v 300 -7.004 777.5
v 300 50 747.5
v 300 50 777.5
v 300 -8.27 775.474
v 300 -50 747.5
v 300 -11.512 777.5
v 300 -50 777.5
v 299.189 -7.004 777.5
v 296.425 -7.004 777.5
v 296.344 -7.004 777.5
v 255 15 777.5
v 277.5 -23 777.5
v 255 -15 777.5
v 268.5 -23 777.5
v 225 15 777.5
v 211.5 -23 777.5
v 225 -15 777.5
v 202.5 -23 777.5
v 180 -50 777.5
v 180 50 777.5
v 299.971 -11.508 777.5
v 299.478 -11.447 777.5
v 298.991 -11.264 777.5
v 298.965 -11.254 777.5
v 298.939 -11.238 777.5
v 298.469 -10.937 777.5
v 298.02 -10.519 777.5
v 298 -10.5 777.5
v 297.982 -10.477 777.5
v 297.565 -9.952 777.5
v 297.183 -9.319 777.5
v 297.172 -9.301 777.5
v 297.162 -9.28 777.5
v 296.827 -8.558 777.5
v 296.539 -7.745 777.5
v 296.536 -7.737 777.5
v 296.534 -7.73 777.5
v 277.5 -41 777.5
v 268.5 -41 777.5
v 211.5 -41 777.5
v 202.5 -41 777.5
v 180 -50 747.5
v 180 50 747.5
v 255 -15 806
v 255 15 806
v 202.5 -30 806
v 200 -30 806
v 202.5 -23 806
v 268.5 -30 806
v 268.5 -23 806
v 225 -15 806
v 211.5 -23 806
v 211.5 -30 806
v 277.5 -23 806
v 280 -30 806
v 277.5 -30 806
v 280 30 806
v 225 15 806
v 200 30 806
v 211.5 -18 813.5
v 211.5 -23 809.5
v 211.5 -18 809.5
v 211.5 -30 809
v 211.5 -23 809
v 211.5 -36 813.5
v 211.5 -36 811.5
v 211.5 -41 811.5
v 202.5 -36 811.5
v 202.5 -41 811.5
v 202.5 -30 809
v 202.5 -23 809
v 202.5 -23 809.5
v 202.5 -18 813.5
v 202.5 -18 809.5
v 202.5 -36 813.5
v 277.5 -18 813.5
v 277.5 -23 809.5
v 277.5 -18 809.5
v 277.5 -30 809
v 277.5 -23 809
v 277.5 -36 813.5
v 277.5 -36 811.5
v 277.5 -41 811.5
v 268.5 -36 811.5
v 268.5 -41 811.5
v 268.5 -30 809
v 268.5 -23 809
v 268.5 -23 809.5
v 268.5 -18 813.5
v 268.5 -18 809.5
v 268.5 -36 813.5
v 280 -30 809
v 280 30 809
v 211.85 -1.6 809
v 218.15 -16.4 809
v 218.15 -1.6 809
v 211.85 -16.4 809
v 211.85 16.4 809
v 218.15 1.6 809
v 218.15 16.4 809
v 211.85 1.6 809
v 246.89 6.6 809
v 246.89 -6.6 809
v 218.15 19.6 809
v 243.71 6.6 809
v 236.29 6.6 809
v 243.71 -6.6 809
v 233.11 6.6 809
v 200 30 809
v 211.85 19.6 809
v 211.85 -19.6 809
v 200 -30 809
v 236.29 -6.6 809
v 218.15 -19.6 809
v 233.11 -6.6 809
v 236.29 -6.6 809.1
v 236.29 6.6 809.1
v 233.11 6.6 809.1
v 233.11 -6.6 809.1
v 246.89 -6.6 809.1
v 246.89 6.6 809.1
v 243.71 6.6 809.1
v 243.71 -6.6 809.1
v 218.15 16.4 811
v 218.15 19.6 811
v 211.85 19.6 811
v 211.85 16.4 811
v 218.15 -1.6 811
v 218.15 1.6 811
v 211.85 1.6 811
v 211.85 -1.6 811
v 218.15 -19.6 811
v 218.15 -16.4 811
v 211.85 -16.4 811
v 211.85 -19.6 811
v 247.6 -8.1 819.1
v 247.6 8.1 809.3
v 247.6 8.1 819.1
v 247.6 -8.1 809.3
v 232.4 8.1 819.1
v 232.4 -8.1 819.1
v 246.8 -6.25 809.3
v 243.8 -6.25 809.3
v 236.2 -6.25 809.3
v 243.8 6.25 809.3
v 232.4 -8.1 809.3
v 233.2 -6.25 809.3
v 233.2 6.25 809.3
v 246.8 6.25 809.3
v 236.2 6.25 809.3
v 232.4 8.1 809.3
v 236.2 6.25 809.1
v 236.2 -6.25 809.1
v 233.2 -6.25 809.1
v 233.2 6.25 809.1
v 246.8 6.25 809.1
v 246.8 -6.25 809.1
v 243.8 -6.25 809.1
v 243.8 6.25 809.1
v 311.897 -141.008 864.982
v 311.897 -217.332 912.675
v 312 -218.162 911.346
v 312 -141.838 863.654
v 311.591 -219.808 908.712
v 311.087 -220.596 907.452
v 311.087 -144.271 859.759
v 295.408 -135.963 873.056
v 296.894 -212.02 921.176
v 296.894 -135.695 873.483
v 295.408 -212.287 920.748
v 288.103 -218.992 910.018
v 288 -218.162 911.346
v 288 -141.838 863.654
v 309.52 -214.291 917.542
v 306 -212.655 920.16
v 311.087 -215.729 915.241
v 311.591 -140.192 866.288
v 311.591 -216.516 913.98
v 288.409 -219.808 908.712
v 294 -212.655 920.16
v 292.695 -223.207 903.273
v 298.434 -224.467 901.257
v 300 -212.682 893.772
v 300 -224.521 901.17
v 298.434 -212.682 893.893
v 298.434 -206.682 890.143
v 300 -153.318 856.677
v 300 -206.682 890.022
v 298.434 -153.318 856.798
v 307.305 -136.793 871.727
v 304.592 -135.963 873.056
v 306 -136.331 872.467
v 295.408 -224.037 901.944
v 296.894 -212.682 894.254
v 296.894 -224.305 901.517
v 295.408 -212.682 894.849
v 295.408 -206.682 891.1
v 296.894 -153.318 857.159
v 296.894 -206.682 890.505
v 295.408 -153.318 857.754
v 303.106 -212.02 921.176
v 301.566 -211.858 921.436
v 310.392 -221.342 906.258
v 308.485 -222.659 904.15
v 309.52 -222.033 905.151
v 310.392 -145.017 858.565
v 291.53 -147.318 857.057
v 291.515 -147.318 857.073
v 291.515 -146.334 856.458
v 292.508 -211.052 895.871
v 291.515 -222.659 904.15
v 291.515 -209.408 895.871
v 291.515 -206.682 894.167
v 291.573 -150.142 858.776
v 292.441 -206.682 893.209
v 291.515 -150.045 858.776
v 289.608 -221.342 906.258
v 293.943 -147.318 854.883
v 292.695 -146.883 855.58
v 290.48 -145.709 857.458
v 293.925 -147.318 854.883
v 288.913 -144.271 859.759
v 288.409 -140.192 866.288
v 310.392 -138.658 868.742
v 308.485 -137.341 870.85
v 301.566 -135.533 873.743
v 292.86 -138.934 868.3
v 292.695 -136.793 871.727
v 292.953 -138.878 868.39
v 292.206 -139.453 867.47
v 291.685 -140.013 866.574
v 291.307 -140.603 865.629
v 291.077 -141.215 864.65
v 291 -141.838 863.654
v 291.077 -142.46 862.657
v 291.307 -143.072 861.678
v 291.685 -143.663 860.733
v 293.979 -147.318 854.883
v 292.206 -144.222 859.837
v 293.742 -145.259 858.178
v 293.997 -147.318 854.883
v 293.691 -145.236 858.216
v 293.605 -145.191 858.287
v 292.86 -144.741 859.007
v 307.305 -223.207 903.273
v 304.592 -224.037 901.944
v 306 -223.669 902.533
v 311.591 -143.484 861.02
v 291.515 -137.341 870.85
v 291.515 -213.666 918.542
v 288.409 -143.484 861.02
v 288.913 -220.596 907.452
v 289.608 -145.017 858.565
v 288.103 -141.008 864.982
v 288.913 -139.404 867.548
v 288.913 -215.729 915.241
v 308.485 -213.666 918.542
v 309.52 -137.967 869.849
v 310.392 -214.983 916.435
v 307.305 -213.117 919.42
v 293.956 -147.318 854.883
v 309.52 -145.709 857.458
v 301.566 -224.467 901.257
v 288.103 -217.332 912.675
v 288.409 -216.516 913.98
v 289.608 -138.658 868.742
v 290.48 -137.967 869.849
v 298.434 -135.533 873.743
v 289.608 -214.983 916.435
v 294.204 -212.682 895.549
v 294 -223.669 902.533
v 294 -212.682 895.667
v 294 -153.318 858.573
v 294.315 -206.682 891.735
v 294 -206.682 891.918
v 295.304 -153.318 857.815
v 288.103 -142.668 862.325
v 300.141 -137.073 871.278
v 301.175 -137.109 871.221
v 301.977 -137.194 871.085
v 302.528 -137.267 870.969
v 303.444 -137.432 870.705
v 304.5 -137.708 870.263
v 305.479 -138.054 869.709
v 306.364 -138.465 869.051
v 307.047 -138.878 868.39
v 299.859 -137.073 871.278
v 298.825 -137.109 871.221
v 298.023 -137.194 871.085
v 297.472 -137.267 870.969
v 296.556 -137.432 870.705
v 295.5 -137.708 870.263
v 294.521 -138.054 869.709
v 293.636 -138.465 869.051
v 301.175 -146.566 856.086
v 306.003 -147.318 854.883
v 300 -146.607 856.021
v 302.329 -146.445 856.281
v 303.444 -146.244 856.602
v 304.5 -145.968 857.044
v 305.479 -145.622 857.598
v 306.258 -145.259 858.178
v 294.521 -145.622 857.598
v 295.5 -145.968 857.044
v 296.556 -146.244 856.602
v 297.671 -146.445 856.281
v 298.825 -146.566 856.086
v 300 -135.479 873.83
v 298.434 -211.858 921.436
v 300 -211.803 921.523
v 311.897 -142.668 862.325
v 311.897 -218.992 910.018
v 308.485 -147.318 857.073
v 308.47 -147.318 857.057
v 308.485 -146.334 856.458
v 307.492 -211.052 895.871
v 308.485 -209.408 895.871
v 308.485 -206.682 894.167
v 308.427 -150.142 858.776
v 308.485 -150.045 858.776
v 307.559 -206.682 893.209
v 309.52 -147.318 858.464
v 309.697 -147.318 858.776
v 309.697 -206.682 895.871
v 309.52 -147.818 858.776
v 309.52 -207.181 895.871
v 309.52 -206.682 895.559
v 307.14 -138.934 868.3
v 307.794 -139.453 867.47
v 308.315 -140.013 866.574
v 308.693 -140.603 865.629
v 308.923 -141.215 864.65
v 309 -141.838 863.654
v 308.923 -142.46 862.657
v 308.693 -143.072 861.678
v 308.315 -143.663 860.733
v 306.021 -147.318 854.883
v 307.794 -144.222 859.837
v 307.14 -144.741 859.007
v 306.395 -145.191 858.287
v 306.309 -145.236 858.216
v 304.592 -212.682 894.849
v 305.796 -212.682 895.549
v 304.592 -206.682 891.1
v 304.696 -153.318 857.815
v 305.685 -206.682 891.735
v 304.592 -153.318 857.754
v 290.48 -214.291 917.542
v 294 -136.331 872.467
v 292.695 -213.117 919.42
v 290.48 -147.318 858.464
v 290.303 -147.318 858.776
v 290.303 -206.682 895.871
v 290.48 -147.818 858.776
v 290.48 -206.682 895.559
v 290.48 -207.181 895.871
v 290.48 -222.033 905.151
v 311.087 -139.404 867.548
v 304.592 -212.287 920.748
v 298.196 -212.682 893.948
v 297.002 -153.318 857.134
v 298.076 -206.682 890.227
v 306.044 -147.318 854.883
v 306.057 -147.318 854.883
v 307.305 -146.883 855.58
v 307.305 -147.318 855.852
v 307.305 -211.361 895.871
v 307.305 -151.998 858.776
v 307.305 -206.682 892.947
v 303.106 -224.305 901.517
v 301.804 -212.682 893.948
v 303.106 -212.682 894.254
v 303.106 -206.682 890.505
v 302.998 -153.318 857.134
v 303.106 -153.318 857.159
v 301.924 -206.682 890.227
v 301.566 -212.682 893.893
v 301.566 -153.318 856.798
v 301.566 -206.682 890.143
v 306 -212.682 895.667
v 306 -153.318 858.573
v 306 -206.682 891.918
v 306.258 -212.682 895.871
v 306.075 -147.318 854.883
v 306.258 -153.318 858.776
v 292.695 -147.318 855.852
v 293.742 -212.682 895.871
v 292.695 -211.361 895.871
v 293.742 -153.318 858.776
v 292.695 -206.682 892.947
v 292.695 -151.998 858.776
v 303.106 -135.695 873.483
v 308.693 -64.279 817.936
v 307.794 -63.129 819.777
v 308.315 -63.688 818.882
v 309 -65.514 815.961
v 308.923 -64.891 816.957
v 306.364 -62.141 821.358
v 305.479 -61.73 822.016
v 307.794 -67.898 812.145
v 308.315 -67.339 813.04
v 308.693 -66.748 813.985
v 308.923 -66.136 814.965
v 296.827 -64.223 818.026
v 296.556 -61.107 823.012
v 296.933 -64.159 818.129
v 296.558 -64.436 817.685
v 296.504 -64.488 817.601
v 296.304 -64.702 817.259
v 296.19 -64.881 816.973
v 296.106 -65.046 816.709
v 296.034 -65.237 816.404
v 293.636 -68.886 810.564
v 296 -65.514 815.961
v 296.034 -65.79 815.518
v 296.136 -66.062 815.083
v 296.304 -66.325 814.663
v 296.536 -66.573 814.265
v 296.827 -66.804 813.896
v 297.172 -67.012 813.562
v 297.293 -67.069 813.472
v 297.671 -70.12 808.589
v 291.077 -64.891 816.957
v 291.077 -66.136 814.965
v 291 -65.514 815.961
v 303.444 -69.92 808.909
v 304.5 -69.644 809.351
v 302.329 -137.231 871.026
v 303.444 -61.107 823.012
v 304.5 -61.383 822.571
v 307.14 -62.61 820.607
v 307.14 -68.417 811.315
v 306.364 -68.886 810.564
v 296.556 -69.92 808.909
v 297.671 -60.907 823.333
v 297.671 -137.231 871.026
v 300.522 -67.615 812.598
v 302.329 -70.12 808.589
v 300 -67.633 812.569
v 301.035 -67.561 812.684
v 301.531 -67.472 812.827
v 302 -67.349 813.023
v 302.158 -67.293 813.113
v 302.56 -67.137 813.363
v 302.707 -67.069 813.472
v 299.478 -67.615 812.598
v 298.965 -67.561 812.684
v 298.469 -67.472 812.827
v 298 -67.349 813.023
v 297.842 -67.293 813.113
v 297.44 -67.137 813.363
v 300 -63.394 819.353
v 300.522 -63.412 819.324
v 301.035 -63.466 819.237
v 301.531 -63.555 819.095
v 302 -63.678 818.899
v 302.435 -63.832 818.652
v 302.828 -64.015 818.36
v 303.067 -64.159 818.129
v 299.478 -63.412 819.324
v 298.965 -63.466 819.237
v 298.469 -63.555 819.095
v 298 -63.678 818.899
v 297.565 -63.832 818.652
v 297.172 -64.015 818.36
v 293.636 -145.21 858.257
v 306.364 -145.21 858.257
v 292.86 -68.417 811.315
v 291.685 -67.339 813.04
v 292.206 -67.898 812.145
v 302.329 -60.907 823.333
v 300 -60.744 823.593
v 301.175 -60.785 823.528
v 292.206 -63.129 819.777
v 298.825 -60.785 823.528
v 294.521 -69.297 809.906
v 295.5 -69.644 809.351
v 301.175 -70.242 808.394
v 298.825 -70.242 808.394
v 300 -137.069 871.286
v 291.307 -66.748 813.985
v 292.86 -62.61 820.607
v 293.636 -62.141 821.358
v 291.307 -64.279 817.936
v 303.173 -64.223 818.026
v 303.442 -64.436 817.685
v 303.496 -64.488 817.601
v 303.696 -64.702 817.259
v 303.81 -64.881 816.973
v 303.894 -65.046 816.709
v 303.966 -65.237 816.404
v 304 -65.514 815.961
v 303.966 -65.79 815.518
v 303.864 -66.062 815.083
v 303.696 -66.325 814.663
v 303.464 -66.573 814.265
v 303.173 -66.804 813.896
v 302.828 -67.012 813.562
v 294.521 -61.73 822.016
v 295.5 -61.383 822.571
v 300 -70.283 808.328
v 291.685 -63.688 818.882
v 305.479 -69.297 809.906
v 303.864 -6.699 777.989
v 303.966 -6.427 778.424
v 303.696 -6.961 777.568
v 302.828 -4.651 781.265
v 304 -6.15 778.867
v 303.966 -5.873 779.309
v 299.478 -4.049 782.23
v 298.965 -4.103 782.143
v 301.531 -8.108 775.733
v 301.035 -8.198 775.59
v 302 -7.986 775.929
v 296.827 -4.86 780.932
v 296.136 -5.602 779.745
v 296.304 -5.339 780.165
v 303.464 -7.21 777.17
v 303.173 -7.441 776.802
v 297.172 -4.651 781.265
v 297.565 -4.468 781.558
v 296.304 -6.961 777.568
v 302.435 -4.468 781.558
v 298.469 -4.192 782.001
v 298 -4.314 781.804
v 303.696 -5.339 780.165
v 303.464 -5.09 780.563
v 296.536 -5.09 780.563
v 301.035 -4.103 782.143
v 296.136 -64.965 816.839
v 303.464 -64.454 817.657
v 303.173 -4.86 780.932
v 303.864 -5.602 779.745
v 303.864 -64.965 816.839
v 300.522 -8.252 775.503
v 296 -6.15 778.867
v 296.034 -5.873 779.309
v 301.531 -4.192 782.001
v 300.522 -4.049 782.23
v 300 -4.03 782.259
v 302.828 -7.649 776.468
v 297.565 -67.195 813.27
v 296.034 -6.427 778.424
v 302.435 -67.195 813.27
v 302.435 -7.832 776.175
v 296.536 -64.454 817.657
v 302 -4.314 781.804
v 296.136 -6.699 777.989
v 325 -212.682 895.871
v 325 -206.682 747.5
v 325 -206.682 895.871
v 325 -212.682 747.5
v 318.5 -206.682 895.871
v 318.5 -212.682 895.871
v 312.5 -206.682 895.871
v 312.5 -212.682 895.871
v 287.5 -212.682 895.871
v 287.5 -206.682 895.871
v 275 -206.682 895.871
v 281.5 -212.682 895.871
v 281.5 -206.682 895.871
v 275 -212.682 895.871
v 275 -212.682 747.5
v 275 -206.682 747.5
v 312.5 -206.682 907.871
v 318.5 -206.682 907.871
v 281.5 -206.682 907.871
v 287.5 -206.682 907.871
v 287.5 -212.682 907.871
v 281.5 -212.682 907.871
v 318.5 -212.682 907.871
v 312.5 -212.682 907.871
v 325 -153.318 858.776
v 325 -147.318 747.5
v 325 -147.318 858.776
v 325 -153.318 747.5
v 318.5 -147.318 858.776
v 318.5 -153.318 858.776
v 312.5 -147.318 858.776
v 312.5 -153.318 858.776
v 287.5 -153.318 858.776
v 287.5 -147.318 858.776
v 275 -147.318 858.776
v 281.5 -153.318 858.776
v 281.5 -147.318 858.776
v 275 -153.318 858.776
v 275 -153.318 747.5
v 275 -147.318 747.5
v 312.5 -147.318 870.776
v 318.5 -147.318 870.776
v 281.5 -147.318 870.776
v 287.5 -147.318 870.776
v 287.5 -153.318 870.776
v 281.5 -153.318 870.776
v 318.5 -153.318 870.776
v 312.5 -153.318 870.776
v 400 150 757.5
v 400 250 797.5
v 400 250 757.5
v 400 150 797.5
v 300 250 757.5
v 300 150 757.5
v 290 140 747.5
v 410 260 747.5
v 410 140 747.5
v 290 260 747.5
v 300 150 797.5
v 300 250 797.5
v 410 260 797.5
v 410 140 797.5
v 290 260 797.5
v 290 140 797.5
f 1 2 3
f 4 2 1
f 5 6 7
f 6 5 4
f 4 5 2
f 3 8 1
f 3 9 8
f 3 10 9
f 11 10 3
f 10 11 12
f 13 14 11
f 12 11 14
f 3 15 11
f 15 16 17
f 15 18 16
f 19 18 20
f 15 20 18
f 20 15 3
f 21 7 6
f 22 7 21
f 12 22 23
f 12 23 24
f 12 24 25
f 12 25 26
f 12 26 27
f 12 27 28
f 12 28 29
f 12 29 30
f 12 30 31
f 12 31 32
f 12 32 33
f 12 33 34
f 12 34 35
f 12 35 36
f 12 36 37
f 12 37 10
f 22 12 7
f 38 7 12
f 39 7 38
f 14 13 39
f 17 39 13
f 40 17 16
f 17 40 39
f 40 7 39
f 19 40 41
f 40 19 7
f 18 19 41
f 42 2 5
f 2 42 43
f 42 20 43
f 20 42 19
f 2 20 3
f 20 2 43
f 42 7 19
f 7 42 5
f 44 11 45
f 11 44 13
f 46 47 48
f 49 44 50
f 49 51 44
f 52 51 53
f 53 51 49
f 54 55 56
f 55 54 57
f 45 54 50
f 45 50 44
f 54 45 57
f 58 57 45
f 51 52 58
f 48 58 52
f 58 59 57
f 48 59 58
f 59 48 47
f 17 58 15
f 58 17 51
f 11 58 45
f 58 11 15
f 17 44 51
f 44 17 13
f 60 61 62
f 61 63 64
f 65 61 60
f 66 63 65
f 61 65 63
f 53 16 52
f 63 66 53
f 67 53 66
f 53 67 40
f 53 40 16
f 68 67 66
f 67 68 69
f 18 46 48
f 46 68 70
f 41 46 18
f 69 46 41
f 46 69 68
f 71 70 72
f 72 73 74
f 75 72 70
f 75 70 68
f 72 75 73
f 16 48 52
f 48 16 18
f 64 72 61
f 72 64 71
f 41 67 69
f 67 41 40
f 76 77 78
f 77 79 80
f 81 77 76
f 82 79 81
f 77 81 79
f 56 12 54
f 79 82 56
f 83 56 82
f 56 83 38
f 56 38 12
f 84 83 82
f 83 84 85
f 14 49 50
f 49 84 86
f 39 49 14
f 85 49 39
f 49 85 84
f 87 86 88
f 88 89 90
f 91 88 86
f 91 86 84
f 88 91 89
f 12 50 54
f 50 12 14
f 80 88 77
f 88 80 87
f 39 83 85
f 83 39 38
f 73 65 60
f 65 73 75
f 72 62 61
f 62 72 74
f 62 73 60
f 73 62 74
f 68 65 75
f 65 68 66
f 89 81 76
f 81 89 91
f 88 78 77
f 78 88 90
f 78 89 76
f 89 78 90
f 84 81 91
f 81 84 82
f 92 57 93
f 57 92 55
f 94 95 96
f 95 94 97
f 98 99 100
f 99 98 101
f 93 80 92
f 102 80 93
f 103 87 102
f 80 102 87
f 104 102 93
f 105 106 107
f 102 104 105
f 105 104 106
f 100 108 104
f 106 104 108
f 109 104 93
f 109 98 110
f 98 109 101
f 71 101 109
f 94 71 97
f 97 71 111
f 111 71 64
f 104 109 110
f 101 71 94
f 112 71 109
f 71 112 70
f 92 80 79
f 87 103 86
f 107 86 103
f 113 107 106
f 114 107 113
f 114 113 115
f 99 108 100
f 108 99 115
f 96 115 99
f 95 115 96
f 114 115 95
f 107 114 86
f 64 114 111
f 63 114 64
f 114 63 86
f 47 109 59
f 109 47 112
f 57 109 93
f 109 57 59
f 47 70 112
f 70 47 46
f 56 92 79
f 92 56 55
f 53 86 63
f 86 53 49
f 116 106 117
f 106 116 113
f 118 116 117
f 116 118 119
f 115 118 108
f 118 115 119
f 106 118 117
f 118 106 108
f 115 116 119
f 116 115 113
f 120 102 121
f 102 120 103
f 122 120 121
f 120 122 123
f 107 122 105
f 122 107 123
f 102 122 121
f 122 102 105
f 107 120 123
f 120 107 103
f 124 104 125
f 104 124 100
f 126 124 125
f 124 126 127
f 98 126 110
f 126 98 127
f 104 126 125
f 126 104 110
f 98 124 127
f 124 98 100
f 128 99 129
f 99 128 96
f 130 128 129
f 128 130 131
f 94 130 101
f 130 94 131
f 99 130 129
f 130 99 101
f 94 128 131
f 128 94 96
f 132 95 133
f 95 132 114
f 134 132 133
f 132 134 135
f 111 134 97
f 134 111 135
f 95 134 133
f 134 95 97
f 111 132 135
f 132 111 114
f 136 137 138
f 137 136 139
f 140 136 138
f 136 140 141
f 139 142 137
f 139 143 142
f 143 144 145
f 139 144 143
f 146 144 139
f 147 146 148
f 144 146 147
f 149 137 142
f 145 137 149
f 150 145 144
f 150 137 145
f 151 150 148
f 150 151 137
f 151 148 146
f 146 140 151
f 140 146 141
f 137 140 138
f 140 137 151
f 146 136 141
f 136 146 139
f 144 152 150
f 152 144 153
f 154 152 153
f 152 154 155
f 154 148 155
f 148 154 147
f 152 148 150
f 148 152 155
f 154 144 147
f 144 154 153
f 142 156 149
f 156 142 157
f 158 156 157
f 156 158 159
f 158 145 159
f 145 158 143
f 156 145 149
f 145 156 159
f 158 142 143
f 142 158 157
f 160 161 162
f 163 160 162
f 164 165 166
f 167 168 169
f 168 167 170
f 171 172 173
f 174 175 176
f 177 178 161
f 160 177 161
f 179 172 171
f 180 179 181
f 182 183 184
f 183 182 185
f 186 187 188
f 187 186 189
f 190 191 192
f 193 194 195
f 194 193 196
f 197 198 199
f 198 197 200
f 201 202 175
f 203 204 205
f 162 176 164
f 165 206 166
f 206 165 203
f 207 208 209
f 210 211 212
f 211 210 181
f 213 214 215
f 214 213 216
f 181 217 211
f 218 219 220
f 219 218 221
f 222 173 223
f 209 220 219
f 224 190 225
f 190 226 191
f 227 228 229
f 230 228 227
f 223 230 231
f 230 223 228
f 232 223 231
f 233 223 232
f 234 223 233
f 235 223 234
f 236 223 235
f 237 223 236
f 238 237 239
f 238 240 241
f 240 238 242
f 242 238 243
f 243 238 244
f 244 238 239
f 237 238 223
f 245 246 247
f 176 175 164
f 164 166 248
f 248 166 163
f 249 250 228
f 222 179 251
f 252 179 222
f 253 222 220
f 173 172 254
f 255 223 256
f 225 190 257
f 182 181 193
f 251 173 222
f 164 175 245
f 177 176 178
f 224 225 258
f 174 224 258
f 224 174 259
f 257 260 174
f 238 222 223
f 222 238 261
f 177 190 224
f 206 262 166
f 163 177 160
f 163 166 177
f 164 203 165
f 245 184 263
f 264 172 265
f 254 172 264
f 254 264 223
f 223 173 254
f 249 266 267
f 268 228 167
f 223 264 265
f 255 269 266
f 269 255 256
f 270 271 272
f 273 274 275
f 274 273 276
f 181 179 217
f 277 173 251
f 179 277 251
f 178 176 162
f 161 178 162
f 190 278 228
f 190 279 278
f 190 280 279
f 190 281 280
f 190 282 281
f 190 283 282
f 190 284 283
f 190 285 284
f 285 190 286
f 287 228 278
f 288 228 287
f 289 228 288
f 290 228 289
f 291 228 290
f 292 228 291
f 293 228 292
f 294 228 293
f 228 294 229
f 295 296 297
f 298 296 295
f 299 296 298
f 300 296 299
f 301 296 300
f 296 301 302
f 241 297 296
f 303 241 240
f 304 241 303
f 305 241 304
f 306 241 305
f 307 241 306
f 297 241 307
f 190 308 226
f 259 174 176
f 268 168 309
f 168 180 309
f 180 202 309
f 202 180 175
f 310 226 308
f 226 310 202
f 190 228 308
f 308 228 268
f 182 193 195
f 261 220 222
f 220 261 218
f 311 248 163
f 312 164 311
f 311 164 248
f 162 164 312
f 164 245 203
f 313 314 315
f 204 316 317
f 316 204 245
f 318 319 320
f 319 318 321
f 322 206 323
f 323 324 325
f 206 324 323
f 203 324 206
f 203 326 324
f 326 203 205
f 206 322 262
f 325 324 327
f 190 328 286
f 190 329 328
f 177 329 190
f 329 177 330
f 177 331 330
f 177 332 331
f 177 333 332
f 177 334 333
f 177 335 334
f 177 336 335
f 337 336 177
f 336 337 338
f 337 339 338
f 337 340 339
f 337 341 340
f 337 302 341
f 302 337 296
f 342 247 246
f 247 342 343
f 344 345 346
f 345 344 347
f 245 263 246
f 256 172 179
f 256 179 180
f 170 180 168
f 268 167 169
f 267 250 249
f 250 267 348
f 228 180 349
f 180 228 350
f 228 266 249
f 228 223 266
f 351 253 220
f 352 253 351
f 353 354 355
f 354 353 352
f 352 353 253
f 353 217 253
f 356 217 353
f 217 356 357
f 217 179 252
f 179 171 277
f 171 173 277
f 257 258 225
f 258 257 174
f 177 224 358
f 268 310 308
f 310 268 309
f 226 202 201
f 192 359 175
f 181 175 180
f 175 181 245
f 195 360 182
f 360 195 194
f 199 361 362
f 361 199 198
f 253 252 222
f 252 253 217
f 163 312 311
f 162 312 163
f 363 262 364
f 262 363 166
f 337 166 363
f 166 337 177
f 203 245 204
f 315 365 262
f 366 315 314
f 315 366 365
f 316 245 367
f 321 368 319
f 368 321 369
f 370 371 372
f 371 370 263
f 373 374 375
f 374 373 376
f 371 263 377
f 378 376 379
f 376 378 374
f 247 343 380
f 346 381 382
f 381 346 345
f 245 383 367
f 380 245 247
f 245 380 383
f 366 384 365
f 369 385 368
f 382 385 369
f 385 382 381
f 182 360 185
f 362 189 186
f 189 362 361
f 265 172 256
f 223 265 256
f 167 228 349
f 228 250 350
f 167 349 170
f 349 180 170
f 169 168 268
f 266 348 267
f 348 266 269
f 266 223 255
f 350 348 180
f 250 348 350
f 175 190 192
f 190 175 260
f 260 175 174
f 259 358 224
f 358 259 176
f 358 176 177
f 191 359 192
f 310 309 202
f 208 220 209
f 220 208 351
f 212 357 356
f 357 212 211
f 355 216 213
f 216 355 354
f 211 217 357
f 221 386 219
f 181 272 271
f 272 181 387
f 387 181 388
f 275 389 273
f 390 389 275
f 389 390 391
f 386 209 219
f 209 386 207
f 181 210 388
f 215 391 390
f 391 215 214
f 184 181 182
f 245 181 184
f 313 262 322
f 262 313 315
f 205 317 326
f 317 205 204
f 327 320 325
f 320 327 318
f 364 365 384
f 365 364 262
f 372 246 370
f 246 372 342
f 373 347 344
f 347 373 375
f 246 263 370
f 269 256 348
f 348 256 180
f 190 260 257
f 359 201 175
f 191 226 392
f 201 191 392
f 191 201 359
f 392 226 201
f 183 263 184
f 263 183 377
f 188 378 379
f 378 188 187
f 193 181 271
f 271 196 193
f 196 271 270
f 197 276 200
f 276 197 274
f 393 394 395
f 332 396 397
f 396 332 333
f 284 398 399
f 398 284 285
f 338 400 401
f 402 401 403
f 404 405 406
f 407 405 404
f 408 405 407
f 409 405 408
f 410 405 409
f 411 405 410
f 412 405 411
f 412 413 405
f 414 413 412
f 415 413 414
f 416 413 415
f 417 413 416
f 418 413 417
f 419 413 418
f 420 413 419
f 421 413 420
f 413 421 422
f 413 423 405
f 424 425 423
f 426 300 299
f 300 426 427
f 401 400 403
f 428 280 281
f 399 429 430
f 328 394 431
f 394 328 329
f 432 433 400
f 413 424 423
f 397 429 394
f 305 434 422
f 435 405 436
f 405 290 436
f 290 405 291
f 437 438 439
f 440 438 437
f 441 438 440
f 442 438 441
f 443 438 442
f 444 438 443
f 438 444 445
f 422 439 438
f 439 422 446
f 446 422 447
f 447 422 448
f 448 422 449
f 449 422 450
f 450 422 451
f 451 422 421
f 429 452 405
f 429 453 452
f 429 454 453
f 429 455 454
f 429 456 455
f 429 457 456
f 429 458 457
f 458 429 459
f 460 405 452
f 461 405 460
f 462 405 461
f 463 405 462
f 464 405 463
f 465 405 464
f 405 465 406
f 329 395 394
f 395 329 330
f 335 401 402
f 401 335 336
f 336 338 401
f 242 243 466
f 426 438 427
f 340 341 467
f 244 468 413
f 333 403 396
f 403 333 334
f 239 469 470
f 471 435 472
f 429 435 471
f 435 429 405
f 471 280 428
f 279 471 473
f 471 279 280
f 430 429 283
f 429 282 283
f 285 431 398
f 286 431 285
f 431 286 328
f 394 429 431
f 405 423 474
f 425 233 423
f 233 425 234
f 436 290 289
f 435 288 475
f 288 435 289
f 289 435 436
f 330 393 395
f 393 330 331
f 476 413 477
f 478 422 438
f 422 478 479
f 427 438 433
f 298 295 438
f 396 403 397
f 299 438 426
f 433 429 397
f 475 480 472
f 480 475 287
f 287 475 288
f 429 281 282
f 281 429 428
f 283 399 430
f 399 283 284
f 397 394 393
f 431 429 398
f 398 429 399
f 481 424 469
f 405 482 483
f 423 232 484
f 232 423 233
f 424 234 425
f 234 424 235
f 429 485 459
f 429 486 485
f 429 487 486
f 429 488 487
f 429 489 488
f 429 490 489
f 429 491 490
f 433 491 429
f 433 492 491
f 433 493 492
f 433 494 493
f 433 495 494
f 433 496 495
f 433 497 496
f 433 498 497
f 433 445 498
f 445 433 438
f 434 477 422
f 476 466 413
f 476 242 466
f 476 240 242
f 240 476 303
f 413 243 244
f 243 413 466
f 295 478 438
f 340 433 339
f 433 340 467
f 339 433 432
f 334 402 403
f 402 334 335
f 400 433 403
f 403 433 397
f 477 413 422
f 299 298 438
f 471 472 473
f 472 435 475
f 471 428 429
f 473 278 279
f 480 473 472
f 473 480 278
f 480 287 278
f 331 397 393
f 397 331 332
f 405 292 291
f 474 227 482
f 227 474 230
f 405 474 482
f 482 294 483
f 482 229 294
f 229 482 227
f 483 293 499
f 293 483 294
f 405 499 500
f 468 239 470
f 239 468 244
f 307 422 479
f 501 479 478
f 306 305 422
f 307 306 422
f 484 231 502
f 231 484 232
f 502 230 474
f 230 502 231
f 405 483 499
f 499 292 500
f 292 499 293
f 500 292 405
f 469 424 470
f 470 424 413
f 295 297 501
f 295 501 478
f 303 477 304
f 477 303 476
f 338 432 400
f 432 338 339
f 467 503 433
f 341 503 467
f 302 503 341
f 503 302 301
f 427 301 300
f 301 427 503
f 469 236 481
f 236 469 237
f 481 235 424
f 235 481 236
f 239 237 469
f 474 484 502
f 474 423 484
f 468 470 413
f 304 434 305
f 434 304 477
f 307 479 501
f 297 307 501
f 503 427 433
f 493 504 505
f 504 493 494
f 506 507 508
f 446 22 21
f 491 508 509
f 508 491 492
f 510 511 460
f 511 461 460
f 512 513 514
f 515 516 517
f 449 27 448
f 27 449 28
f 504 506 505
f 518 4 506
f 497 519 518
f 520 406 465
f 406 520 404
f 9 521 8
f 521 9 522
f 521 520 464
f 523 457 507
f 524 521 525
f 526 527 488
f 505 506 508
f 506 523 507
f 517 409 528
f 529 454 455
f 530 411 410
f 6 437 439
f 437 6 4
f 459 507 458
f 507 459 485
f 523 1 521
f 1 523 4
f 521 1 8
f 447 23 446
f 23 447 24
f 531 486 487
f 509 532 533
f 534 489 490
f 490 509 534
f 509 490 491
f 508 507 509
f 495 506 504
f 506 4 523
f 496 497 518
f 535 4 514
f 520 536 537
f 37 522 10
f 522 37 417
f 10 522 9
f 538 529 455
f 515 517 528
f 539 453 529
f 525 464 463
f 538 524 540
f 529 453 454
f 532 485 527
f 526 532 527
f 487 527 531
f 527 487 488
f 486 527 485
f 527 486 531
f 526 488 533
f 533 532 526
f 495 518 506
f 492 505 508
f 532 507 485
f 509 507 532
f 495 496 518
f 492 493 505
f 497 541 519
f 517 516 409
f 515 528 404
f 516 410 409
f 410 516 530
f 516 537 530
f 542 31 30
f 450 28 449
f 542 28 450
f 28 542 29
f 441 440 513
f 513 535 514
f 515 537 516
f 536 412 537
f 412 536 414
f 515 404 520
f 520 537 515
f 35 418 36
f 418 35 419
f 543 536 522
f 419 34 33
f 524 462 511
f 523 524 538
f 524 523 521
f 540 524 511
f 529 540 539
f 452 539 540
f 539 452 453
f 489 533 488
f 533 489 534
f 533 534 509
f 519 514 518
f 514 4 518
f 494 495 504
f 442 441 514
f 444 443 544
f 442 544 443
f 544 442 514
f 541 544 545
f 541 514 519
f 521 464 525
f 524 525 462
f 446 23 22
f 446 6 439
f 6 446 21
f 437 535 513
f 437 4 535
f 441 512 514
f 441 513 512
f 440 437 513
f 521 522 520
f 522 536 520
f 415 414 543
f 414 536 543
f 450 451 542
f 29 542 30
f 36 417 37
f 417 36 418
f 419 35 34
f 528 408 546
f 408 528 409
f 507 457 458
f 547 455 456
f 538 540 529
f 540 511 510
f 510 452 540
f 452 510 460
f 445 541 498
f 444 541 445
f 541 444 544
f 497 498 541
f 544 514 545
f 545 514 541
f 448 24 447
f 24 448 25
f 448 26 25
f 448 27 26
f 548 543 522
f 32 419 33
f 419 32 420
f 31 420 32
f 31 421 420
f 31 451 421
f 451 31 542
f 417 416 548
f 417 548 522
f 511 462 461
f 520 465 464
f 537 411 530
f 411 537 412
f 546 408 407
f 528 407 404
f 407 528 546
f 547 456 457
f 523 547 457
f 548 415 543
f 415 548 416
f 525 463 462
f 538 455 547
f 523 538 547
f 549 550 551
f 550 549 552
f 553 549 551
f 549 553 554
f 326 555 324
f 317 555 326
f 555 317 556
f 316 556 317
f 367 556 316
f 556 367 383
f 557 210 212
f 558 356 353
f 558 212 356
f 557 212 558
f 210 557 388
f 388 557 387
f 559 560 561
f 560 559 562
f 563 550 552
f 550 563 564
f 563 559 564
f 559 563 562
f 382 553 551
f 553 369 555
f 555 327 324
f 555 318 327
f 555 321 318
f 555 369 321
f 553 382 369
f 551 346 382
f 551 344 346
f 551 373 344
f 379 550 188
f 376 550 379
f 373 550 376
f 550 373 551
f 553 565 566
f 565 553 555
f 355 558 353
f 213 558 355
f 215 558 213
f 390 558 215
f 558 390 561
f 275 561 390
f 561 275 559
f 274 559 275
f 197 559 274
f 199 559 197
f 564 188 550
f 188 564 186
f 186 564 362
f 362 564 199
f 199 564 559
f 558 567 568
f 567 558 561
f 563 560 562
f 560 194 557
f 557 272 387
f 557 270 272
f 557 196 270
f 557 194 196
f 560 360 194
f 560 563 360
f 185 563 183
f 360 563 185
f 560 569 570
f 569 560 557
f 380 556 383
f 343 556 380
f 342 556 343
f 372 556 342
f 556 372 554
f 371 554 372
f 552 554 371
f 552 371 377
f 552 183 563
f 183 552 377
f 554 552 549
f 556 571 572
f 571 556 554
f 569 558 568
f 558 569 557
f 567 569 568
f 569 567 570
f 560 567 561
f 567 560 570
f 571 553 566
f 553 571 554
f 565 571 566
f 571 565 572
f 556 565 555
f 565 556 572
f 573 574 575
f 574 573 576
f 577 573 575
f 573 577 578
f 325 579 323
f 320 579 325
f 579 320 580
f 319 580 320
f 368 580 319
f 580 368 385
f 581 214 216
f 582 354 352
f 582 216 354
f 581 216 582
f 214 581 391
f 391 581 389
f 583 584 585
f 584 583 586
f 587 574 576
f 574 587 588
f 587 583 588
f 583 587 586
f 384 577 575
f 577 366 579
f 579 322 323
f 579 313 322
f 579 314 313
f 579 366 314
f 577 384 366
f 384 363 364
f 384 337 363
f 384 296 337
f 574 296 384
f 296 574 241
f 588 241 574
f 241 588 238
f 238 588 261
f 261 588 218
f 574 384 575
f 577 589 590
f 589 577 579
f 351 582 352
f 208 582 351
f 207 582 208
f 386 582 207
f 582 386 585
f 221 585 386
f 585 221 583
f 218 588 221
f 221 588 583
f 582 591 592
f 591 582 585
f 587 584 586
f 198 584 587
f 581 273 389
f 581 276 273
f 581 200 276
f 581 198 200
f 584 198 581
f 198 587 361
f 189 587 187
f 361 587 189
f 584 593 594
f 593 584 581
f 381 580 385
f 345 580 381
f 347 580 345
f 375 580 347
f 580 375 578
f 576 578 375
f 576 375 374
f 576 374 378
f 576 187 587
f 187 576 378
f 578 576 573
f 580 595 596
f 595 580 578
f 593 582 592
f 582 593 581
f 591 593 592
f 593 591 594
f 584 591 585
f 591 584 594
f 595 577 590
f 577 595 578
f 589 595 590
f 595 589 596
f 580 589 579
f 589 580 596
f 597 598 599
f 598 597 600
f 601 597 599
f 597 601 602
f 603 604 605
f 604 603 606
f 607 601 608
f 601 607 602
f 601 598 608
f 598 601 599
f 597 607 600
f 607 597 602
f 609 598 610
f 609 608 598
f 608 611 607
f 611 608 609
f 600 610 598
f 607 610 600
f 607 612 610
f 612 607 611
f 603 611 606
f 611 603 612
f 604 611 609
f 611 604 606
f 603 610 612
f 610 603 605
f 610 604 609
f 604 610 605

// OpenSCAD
// Millimetre geometric reference; use real functional tools, not printed heated or cutting equipment.
// Source SHA-256: 493e0b693f89c281eb8da39abb29a7e02fd7501da94857ba81c94d8b38a3dbba
$fn=48;
module stage(){
translate([0, 0, 0]) rotate([0, 0, 0]) cube([120, 100, 30],center=true);
translate([0, 0, 29.25]) rotate([0, 0, 0]) cube([30, 30, 28.5],center=true);
translate([-33, -32, 32]) rotate([0, 0, 0]) cube([9, 18, 34],center=true);
translate([33, -32, 32]) rotate([0, 0, 0]) cube([9, 18, 34],center=true);
translate([-33, -27, 49]) rotate([0, 0, 0]) cube([9, 18, 4],center=true);
translate([33, -27, 49]) rotate([0, 0, 0]) cube([9, 18, 4],center=true);
}
module board(){
translate([0, 0, 0]) rotate([0, 0, 0]) cube([80, 60, 3],center=true);
translate([-5.3, 0, 1.55]) rotate([0, 0, 0]) cube([3.18, 13.2, 0.1],center=true);
translate([5.3, 0, 1.55]) rotate([0, 0, 0]) cube([3.18, 13.2, 0.1],center=true);
translate([-25, 18, 2.5]) rotate([0, 0, 0]) cube([6.3, 3.2, 2],center=true);
translate([-25, 0, 2.5]) rotate([0, 0, 0]) cube([6.3, 3.2, 2],center=true);
translate([-25, -18, 2.5]) rotate([0, 0, 0]) cube([6.3, 3.2, 2],center=true);
}
module part(){
translate([0, 0, 0]) rotate([0, 0, 0]) cube([15.2, 16.2, 9.8],center=true);
translate([-5.3, 0, -5]) rotate([0, 0, 0]) cube([3, 12.5, 0.2],center=true);
translate([5.3, 0, -5]) rotate([0, 0, 0]) cube([3, 12.5, 0.2],center=true);
}
module hot_air(){
translate([0, 0, 0]) rotate([-32, 0, 0]) rotate([90,0,0]) cylinder(r=12,h=90,center=true);
translate([0, 76.3243286541, -47.692733781]) rotate([-32, 0, 0]) rotate([90,0,0]) cylinder(r=9,h=90,center=true);
translate([0, 144.168176347, -90.0862749196]) rotate([-32, 0, 0]) rotate([90,0,0]) cylinder(r=4,h=70,center=true);
}
module gun_stand_back(){
translate([0, 0, 0]) rotate([0, 0, 0]) cube([50, 6, 148.370597094],center=true);
translate([-15.5, 0, 80.1852985471]) rotate([0, 0, 0]) cube([6, 6, 12],center=true);
translate([15.5, 0, 80.1852985471]) rotate([0, 0, 0]) cube([6, 6, 12],center=true);
}
module gun_stand_front(){
translate([0, 0, 0]) rotate([0, 0, 0]) cube([50, 6, 111.276248598],center=true);
translate([-15.5, 0, 61.638124299]) rotate([0, 0, 0]) cube([6, 6, 12],center=true);
translate([15.5, 0, 61.638124299]) rotate([0, 0, 0]) cube([6, 6, 12],center=true);
}
module tray_floor(){
translate([0, 0, 0]) rotate([0, 0, 0]) cube([100, 100, 10],center=true);
}
module tray_x_low(){
translate([0, 0, 0]) rotate([0, 0, 0]) cube([10, 120, 50],center=true);
}
module tray_x_high(){
translate([0, 0, 0]) rotate([0, 0, 0]) cube([10, 120, 50],center=true);
}
module tray_y_low(){
translate([0, 0, 0]) rotate([0, 0, 0]) cube([100, 10, 50],center=true);
}
module tray_y_high(){
translate([0, 0, 0]) rotate([0, 0, 0]) cube([100, 10, 50],center=true);
}
translate([240, 0, 762.5]) rotate([0,0,0]) stage();
translate([240, 0, 807.5]) rotate([0,0,0]) board();
translate([240, 0, 814.2]) rotate([0,0,0]) part();
translate([300, -180, 887.5]) rotate([0,0,0]) hot_air();
translate([300, -209.681683365, 821.685298547]) rotate([0,0,0]) gun_stand_back();
translate([300, -150.318316635, 803.138124299]) rotate([0,0,0]) gun_stand_front();
translate([350, 200, 752.5]) rotate([0,0,0]) tray_floor();
translate([295, 200, 772.5]) rotate([0,0,0]) tray_x_low();
translate([405, 200, 772.5]) rotate([0,0,0]) tray_x_high();
translate([350, 145, 772.5]) rotate([0,0,0]) tray_y_low();
translate([350, 255, 772.5]) rotate([0,0,0]) tray_y_high();
